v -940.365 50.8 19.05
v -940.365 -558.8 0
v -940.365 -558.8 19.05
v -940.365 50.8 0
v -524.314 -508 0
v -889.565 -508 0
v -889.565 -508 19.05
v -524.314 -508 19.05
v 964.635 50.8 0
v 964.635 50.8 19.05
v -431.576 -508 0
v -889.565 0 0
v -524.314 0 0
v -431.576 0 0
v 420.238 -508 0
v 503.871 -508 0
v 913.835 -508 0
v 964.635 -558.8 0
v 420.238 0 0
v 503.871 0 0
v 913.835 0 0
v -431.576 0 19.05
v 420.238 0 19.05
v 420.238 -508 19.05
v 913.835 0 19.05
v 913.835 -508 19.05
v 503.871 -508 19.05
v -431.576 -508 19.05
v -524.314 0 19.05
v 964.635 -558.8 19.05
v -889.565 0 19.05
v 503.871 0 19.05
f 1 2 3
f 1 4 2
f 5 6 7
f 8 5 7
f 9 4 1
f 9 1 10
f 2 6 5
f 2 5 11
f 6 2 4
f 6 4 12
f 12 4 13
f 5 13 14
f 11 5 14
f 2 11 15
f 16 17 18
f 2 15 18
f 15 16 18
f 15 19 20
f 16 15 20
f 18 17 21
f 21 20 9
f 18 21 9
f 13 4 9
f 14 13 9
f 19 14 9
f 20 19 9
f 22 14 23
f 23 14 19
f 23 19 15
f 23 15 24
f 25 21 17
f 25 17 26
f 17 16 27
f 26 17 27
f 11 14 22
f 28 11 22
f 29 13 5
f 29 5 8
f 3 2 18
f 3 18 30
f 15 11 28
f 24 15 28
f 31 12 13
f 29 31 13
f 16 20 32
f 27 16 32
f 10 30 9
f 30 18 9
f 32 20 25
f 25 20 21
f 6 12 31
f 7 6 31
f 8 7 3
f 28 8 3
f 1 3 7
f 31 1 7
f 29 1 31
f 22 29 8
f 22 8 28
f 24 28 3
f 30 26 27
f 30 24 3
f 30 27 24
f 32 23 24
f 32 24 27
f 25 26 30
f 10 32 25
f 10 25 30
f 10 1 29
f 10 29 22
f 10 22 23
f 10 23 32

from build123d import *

# Parameters (mm, degrees)
F0_W     = 1905
F0_H     = 50.8
F1_DEPTH = 19.05
F2_W     = 50.8
F2_H     = 19.05
F3_DEPTH = 558.8
F4_W     = 50.8
F4_H     = 19.05
F5_DEPTH = 1854.2
F6_W     = 83.633751
F6_H     = 19.05
F6_W_2   = 92.737854
F7_DEPTH = 558.8


with BuildPart() as f1:
    # F0 (on Top) → F1 (new body)
    with BuildSketch(Plane.XY):
        with Locations((12.134612, 25.4)):
            Rectangle(F0_W, F0_H)
    extrude(amount=F1_DEPTH)

    # F2 (on face) → F3 (join)
    with BuildSketch(Plane.XZ):
        with Locations((-914.965388, 9.525)):
            Rectangle(F2_W, F2_H)
        with Locations((939.234612, 9.525)):
            Rectangle(F2_W, F2_H)
    extrude(amount=F3_DEPTH)

    # F4 (on face) → F5 (join)
    with BuildSketch(Plane.YZ.offset(-889.565388)):
        with Locations((-533.4, 9.525)):
            Rectangle(F4_W, F4_H)
    extrude(amount=F5_DEPTH)

    # F6 (on face) → F7 (join)
    with BuildSketch(Plane.XZ):
        with Locations((462.054446, 9.525)):
            Rectangle(F6_W, F6_H)
        with Locations((-477.944821, 9.525)):
            Rectangle(F6_W_2, F6_H)
    extrude(amount=F7_DEPTH)


solid = f1.part
